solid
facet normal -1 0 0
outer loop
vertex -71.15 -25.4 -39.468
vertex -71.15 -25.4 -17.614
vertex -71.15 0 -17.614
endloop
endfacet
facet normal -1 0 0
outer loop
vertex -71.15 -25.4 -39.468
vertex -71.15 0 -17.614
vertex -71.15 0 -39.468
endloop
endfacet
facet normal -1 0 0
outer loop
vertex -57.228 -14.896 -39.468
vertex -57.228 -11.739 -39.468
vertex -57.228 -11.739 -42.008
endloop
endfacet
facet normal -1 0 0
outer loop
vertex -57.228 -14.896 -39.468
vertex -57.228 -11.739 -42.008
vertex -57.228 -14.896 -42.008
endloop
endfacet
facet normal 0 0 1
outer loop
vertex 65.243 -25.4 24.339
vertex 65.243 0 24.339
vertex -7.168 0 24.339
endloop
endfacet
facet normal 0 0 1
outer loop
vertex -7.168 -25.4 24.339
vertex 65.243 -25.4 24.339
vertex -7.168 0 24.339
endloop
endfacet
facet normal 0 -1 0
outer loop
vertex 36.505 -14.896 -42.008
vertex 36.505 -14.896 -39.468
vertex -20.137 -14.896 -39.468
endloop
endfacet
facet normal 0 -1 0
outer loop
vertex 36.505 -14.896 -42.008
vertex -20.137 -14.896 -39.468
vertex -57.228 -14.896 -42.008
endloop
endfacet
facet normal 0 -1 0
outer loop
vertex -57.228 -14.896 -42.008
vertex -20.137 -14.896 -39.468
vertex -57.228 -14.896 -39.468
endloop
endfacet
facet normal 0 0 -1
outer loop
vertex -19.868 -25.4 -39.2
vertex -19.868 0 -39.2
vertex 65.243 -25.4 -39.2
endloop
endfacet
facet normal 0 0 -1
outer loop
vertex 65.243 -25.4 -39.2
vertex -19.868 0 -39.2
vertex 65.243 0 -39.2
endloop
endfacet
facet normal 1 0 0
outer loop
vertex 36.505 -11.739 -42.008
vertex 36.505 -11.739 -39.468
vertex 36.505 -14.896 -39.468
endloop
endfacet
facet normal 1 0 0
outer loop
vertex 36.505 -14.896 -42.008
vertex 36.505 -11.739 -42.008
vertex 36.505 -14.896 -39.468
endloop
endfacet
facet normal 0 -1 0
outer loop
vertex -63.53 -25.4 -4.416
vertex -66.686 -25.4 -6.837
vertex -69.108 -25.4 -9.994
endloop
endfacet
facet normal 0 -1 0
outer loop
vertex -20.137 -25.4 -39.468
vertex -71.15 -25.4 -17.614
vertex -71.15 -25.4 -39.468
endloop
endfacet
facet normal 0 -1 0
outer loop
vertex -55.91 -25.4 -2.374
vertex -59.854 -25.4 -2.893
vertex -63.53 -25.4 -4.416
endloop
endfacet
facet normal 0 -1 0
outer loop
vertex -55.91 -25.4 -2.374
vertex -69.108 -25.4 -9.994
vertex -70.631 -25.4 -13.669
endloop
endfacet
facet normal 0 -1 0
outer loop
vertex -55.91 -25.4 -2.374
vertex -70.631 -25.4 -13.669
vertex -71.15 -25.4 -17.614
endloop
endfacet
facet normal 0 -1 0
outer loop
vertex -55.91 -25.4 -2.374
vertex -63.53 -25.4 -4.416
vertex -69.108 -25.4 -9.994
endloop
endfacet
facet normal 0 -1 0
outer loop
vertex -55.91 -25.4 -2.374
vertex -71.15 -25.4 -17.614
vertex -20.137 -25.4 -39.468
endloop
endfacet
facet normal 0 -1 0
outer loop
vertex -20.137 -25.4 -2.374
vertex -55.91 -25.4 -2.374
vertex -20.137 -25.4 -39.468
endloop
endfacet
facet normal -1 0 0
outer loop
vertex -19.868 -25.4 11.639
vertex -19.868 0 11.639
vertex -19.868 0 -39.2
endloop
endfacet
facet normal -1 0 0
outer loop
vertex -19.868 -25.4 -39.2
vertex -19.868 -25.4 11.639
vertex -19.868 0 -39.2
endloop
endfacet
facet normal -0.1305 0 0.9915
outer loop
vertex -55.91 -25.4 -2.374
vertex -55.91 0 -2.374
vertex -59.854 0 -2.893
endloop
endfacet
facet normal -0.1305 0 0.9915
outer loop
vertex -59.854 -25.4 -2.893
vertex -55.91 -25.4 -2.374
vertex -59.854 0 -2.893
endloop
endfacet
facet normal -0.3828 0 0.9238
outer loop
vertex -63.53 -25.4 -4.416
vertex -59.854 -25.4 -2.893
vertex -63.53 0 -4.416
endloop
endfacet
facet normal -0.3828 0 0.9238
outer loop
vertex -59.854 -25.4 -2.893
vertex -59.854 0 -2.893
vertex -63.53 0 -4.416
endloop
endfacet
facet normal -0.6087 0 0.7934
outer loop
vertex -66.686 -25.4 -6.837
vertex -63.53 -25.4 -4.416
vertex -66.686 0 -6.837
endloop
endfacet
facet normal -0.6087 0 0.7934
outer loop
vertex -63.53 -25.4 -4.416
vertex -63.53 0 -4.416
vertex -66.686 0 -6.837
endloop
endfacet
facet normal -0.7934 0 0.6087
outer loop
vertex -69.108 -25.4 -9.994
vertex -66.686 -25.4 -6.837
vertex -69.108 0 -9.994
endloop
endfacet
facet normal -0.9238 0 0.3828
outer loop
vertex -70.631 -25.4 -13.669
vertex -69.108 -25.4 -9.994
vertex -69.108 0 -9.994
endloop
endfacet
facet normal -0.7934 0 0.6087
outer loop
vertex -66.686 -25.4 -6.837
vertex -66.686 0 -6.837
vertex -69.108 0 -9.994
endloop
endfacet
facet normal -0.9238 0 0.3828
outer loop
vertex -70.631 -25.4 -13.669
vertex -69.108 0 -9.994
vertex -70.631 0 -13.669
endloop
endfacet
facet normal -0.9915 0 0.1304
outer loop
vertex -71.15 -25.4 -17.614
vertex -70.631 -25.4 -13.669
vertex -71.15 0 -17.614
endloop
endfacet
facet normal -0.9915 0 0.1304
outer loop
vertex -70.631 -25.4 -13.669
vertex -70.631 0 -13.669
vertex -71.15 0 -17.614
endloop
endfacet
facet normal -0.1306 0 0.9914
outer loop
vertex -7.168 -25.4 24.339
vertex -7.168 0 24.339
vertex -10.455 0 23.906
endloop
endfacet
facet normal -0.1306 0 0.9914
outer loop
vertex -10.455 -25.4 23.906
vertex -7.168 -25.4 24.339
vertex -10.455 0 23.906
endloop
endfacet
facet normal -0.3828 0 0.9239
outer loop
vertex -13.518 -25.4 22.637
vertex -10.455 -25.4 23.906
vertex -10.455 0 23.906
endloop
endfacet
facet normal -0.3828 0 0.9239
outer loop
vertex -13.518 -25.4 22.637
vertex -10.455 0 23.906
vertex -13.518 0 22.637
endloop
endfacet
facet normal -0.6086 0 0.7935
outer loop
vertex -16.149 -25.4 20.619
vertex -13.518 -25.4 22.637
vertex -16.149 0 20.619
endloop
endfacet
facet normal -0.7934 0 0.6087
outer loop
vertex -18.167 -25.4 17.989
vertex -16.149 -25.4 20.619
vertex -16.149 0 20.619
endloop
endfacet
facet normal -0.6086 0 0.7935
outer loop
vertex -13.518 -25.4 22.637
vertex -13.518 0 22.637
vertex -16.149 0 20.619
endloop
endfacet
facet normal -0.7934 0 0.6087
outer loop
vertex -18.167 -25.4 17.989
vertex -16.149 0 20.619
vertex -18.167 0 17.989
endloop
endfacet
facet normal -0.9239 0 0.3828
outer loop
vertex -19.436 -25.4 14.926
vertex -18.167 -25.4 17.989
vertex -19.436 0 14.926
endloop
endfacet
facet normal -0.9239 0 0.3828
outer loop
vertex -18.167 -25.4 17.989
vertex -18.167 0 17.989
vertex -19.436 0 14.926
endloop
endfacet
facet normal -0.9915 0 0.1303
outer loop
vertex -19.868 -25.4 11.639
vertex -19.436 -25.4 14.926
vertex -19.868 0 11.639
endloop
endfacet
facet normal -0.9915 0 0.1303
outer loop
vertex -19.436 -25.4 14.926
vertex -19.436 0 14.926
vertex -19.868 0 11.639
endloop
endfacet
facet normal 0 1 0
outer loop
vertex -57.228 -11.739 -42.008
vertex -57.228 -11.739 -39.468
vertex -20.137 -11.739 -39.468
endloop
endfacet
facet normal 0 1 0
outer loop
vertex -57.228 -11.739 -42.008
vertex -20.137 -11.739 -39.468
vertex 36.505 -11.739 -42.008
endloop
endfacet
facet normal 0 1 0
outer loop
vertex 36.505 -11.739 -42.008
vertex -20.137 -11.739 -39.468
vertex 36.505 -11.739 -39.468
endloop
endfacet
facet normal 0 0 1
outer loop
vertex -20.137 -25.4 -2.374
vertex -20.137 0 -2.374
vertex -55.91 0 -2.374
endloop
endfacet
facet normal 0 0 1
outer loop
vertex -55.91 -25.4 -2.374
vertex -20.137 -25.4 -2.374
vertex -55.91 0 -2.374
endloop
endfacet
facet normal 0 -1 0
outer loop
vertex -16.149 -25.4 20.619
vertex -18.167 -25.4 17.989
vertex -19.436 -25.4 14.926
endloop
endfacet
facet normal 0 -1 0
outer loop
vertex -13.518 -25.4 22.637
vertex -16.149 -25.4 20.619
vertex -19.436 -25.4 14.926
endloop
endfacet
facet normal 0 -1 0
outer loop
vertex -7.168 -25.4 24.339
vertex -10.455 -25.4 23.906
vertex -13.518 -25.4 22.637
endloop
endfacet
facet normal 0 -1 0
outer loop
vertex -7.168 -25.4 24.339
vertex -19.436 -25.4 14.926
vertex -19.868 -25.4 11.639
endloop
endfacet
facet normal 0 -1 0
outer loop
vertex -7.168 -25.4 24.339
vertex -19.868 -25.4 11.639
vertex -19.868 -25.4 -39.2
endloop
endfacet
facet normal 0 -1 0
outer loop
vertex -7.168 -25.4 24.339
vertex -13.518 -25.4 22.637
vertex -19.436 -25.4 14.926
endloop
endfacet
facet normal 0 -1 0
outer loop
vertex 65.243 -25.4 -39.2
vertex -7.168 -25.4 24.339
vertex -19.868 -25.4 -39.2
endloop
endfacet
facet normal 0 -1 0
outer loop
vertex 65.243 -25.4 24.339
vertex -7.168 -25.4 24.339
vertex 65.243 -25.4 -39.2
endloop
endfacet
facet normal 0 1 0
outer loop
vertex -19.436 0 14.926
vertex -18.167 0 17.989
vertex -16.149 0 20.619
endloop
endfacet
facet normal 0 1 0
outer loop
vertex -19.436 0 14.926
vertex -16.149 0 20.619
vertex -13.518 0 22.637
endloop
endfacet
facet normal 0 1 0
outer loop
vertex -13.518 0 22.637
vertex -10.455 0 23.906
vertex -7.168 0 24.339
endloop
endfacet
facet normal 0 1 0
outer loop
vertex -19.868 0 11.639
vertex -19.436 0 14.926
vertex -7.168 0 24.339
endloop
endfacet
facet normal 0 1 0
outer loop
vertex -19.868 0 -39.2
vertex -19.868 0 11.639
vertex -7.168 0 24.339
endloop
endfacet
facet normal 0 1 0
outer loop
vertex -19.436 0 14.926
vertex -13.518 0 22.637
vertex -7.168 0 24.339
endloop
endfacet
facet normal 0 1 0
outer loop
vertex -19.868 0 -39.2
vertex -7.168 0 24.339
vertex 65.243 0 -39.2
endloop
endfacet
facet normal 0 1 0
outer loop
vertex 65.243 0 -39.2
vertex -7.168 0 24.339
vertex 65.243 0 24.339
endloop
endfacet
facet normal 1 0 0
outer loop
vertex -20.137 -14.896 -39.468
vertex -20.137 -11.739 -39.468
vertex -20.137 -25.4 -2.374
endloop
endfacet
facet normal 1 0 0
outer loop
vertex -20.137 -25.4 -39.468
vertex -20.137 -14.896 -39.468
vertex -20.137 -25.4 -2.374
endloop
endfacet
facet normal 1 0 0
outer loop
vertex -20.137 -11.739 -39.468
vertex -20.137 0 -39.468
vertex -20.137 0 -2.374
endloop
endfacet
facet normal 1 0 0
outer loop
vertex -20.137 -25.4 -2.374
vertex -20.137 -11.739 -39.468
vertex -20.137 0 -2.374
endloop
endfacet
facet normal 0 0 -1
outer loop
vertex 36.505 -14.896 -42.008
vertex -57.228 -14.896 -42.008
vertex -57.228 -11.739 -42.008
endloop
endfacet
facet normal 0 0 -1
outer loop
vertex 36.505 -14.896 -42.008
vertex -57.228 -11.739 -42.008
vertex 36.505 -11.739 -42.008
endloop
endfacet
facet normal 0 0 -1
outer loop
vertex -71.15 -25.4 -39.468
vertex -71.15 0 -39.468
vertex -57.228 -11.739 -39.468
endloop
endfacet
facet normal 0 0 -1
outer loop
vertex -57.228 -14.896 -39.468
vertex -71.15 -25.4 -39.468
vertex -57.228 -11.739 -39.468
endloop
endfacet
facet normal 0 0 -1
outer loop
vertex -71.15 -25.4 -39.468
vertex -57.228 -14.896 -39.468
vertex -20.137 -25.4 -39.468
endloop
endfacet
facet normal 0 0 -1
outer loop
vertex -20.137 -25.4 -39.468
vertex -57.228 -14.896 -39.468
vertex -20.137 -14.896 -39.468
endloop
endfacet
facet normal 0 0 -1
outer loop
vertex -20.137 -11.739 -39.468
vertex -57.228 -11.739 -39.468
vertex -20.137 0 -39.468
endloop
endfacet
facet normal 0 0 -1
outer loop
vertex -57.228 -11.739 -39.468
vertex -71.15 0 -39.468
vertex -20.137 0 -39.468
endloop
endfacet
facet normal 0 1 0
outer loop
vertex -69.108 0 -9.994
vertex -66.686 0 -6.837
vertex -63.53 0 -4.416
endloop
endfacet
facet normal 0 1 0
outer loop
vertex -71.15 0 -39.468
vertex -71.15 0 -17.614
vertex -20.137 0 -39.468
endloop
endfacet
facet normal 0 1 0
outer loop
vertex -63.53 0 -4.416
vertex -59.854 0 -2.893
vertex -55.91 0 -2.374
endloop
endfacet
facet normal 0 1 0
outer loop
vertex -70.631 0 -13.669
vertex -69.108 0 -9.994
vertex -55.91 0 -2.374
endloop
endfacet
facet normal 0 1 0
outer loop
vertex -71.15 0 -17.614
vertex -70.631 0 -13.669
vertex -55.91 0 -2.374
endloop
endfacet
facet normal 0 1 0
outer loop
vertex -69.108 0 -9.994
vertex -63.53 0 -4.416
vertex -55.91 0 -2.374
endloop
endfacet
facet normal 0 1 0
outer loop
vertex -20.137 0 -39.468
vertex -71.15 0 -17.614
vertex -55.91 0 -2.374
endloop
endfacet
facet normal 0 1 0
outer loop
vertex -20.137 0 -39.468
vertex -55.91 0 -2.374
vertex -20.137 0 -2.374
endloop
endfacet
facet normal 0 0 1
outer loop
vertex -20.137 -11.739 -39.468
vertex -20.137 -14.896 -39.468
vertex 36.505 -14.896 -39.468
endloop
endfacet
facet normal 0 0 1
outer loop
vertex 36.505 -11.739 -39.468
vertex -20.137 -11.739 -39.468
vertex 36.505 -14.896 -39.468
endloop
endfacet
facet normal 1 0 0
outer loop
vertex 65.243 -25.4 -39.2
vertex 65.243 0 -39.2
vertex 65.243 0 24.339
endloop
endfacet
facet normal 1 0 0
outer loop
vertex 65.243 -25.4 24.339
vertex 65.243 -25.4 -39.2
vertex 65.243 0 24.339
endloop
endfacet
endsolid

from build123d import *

# Parameters (mm, degrees)
F2_DEPTH = 25.4
F3_DEPTH = 25.4
F7_W     = 37.0916780084
F7_H     = 3.1564831734
F7_W_2   = 56.6421654075
F8_DEPTH = 2.54


# Not quite as in the source:
# - the program builds the solid bodies; features that only make, move or delete a surface that nothing else refers to are left out


with BuildPart() as f2:
    # F0 (on Front) → F2 (new body)
    with BuildSketch(Plane.XZ):
        with BuildLine():
            Line((65.2430579066, 24.3388270795), (-7.1682546616, 24.3388270795))
            ThreePointArc((-7.1682546616, 24.3388270795), (-16.1485107826, 20.6190832006), (-19.8682546616, 11.6388270795))
            Line((-19.8682546616, 11.6388270795), (-19.8682546616, -39.1995310783))
            Line((-19.8682546616, -39.1995310783), (65.2430579066, -39.1995310783))
            Line((65.2430579066, -39.1995310783), (65.2430579066, 24.3388270795))
        make_face()
    extrude(amount=F2_DEPTH)


with BuildPart() as f3:
    # F1 (on Front) → F3 (new body)
    with BuildSketch(Plane.XZ):
        with BuildLine():
            Line((-20.1367456466, -39.4680202007), (-20.1367456466, -2.3737917019))
            Line((-20.1367456466, -2.3737917019), (-55.9098335004, -2.3737917019))
            ThreePointArc((-55.9098335004, -2.3737917019), (-66.6861408457, -6.8374843567), (-71.1498335004, -17.6137917019))
            Line((-71.1498335004, -17.6137917019), (-71.1498335004, -39.4680202007))
            Line((-71.1498335004, -39.4680202007), (-20.1367456466, -39.4680202007))
        make_face()
    extrude(amount=F3_DEPTH)

    # F7 (on face) → F8 (join)
    with BuildSketch(Plane(origin=(0, 0, -39.4680202007), x_dir=(1, 0, 0), z_dir=(0, 0, -1))):
        with Locations((-38.6825846508, 13.3175728843)):
            Rectangle(F7_W, F7_H)
        with Locations((8.1843370572, 13.3175728843)):
            Rectangle(F7_W_2, F7_H)
    extrude(amount=F8_DEPTH)


solid = Compound([f2.part, f3.part])
